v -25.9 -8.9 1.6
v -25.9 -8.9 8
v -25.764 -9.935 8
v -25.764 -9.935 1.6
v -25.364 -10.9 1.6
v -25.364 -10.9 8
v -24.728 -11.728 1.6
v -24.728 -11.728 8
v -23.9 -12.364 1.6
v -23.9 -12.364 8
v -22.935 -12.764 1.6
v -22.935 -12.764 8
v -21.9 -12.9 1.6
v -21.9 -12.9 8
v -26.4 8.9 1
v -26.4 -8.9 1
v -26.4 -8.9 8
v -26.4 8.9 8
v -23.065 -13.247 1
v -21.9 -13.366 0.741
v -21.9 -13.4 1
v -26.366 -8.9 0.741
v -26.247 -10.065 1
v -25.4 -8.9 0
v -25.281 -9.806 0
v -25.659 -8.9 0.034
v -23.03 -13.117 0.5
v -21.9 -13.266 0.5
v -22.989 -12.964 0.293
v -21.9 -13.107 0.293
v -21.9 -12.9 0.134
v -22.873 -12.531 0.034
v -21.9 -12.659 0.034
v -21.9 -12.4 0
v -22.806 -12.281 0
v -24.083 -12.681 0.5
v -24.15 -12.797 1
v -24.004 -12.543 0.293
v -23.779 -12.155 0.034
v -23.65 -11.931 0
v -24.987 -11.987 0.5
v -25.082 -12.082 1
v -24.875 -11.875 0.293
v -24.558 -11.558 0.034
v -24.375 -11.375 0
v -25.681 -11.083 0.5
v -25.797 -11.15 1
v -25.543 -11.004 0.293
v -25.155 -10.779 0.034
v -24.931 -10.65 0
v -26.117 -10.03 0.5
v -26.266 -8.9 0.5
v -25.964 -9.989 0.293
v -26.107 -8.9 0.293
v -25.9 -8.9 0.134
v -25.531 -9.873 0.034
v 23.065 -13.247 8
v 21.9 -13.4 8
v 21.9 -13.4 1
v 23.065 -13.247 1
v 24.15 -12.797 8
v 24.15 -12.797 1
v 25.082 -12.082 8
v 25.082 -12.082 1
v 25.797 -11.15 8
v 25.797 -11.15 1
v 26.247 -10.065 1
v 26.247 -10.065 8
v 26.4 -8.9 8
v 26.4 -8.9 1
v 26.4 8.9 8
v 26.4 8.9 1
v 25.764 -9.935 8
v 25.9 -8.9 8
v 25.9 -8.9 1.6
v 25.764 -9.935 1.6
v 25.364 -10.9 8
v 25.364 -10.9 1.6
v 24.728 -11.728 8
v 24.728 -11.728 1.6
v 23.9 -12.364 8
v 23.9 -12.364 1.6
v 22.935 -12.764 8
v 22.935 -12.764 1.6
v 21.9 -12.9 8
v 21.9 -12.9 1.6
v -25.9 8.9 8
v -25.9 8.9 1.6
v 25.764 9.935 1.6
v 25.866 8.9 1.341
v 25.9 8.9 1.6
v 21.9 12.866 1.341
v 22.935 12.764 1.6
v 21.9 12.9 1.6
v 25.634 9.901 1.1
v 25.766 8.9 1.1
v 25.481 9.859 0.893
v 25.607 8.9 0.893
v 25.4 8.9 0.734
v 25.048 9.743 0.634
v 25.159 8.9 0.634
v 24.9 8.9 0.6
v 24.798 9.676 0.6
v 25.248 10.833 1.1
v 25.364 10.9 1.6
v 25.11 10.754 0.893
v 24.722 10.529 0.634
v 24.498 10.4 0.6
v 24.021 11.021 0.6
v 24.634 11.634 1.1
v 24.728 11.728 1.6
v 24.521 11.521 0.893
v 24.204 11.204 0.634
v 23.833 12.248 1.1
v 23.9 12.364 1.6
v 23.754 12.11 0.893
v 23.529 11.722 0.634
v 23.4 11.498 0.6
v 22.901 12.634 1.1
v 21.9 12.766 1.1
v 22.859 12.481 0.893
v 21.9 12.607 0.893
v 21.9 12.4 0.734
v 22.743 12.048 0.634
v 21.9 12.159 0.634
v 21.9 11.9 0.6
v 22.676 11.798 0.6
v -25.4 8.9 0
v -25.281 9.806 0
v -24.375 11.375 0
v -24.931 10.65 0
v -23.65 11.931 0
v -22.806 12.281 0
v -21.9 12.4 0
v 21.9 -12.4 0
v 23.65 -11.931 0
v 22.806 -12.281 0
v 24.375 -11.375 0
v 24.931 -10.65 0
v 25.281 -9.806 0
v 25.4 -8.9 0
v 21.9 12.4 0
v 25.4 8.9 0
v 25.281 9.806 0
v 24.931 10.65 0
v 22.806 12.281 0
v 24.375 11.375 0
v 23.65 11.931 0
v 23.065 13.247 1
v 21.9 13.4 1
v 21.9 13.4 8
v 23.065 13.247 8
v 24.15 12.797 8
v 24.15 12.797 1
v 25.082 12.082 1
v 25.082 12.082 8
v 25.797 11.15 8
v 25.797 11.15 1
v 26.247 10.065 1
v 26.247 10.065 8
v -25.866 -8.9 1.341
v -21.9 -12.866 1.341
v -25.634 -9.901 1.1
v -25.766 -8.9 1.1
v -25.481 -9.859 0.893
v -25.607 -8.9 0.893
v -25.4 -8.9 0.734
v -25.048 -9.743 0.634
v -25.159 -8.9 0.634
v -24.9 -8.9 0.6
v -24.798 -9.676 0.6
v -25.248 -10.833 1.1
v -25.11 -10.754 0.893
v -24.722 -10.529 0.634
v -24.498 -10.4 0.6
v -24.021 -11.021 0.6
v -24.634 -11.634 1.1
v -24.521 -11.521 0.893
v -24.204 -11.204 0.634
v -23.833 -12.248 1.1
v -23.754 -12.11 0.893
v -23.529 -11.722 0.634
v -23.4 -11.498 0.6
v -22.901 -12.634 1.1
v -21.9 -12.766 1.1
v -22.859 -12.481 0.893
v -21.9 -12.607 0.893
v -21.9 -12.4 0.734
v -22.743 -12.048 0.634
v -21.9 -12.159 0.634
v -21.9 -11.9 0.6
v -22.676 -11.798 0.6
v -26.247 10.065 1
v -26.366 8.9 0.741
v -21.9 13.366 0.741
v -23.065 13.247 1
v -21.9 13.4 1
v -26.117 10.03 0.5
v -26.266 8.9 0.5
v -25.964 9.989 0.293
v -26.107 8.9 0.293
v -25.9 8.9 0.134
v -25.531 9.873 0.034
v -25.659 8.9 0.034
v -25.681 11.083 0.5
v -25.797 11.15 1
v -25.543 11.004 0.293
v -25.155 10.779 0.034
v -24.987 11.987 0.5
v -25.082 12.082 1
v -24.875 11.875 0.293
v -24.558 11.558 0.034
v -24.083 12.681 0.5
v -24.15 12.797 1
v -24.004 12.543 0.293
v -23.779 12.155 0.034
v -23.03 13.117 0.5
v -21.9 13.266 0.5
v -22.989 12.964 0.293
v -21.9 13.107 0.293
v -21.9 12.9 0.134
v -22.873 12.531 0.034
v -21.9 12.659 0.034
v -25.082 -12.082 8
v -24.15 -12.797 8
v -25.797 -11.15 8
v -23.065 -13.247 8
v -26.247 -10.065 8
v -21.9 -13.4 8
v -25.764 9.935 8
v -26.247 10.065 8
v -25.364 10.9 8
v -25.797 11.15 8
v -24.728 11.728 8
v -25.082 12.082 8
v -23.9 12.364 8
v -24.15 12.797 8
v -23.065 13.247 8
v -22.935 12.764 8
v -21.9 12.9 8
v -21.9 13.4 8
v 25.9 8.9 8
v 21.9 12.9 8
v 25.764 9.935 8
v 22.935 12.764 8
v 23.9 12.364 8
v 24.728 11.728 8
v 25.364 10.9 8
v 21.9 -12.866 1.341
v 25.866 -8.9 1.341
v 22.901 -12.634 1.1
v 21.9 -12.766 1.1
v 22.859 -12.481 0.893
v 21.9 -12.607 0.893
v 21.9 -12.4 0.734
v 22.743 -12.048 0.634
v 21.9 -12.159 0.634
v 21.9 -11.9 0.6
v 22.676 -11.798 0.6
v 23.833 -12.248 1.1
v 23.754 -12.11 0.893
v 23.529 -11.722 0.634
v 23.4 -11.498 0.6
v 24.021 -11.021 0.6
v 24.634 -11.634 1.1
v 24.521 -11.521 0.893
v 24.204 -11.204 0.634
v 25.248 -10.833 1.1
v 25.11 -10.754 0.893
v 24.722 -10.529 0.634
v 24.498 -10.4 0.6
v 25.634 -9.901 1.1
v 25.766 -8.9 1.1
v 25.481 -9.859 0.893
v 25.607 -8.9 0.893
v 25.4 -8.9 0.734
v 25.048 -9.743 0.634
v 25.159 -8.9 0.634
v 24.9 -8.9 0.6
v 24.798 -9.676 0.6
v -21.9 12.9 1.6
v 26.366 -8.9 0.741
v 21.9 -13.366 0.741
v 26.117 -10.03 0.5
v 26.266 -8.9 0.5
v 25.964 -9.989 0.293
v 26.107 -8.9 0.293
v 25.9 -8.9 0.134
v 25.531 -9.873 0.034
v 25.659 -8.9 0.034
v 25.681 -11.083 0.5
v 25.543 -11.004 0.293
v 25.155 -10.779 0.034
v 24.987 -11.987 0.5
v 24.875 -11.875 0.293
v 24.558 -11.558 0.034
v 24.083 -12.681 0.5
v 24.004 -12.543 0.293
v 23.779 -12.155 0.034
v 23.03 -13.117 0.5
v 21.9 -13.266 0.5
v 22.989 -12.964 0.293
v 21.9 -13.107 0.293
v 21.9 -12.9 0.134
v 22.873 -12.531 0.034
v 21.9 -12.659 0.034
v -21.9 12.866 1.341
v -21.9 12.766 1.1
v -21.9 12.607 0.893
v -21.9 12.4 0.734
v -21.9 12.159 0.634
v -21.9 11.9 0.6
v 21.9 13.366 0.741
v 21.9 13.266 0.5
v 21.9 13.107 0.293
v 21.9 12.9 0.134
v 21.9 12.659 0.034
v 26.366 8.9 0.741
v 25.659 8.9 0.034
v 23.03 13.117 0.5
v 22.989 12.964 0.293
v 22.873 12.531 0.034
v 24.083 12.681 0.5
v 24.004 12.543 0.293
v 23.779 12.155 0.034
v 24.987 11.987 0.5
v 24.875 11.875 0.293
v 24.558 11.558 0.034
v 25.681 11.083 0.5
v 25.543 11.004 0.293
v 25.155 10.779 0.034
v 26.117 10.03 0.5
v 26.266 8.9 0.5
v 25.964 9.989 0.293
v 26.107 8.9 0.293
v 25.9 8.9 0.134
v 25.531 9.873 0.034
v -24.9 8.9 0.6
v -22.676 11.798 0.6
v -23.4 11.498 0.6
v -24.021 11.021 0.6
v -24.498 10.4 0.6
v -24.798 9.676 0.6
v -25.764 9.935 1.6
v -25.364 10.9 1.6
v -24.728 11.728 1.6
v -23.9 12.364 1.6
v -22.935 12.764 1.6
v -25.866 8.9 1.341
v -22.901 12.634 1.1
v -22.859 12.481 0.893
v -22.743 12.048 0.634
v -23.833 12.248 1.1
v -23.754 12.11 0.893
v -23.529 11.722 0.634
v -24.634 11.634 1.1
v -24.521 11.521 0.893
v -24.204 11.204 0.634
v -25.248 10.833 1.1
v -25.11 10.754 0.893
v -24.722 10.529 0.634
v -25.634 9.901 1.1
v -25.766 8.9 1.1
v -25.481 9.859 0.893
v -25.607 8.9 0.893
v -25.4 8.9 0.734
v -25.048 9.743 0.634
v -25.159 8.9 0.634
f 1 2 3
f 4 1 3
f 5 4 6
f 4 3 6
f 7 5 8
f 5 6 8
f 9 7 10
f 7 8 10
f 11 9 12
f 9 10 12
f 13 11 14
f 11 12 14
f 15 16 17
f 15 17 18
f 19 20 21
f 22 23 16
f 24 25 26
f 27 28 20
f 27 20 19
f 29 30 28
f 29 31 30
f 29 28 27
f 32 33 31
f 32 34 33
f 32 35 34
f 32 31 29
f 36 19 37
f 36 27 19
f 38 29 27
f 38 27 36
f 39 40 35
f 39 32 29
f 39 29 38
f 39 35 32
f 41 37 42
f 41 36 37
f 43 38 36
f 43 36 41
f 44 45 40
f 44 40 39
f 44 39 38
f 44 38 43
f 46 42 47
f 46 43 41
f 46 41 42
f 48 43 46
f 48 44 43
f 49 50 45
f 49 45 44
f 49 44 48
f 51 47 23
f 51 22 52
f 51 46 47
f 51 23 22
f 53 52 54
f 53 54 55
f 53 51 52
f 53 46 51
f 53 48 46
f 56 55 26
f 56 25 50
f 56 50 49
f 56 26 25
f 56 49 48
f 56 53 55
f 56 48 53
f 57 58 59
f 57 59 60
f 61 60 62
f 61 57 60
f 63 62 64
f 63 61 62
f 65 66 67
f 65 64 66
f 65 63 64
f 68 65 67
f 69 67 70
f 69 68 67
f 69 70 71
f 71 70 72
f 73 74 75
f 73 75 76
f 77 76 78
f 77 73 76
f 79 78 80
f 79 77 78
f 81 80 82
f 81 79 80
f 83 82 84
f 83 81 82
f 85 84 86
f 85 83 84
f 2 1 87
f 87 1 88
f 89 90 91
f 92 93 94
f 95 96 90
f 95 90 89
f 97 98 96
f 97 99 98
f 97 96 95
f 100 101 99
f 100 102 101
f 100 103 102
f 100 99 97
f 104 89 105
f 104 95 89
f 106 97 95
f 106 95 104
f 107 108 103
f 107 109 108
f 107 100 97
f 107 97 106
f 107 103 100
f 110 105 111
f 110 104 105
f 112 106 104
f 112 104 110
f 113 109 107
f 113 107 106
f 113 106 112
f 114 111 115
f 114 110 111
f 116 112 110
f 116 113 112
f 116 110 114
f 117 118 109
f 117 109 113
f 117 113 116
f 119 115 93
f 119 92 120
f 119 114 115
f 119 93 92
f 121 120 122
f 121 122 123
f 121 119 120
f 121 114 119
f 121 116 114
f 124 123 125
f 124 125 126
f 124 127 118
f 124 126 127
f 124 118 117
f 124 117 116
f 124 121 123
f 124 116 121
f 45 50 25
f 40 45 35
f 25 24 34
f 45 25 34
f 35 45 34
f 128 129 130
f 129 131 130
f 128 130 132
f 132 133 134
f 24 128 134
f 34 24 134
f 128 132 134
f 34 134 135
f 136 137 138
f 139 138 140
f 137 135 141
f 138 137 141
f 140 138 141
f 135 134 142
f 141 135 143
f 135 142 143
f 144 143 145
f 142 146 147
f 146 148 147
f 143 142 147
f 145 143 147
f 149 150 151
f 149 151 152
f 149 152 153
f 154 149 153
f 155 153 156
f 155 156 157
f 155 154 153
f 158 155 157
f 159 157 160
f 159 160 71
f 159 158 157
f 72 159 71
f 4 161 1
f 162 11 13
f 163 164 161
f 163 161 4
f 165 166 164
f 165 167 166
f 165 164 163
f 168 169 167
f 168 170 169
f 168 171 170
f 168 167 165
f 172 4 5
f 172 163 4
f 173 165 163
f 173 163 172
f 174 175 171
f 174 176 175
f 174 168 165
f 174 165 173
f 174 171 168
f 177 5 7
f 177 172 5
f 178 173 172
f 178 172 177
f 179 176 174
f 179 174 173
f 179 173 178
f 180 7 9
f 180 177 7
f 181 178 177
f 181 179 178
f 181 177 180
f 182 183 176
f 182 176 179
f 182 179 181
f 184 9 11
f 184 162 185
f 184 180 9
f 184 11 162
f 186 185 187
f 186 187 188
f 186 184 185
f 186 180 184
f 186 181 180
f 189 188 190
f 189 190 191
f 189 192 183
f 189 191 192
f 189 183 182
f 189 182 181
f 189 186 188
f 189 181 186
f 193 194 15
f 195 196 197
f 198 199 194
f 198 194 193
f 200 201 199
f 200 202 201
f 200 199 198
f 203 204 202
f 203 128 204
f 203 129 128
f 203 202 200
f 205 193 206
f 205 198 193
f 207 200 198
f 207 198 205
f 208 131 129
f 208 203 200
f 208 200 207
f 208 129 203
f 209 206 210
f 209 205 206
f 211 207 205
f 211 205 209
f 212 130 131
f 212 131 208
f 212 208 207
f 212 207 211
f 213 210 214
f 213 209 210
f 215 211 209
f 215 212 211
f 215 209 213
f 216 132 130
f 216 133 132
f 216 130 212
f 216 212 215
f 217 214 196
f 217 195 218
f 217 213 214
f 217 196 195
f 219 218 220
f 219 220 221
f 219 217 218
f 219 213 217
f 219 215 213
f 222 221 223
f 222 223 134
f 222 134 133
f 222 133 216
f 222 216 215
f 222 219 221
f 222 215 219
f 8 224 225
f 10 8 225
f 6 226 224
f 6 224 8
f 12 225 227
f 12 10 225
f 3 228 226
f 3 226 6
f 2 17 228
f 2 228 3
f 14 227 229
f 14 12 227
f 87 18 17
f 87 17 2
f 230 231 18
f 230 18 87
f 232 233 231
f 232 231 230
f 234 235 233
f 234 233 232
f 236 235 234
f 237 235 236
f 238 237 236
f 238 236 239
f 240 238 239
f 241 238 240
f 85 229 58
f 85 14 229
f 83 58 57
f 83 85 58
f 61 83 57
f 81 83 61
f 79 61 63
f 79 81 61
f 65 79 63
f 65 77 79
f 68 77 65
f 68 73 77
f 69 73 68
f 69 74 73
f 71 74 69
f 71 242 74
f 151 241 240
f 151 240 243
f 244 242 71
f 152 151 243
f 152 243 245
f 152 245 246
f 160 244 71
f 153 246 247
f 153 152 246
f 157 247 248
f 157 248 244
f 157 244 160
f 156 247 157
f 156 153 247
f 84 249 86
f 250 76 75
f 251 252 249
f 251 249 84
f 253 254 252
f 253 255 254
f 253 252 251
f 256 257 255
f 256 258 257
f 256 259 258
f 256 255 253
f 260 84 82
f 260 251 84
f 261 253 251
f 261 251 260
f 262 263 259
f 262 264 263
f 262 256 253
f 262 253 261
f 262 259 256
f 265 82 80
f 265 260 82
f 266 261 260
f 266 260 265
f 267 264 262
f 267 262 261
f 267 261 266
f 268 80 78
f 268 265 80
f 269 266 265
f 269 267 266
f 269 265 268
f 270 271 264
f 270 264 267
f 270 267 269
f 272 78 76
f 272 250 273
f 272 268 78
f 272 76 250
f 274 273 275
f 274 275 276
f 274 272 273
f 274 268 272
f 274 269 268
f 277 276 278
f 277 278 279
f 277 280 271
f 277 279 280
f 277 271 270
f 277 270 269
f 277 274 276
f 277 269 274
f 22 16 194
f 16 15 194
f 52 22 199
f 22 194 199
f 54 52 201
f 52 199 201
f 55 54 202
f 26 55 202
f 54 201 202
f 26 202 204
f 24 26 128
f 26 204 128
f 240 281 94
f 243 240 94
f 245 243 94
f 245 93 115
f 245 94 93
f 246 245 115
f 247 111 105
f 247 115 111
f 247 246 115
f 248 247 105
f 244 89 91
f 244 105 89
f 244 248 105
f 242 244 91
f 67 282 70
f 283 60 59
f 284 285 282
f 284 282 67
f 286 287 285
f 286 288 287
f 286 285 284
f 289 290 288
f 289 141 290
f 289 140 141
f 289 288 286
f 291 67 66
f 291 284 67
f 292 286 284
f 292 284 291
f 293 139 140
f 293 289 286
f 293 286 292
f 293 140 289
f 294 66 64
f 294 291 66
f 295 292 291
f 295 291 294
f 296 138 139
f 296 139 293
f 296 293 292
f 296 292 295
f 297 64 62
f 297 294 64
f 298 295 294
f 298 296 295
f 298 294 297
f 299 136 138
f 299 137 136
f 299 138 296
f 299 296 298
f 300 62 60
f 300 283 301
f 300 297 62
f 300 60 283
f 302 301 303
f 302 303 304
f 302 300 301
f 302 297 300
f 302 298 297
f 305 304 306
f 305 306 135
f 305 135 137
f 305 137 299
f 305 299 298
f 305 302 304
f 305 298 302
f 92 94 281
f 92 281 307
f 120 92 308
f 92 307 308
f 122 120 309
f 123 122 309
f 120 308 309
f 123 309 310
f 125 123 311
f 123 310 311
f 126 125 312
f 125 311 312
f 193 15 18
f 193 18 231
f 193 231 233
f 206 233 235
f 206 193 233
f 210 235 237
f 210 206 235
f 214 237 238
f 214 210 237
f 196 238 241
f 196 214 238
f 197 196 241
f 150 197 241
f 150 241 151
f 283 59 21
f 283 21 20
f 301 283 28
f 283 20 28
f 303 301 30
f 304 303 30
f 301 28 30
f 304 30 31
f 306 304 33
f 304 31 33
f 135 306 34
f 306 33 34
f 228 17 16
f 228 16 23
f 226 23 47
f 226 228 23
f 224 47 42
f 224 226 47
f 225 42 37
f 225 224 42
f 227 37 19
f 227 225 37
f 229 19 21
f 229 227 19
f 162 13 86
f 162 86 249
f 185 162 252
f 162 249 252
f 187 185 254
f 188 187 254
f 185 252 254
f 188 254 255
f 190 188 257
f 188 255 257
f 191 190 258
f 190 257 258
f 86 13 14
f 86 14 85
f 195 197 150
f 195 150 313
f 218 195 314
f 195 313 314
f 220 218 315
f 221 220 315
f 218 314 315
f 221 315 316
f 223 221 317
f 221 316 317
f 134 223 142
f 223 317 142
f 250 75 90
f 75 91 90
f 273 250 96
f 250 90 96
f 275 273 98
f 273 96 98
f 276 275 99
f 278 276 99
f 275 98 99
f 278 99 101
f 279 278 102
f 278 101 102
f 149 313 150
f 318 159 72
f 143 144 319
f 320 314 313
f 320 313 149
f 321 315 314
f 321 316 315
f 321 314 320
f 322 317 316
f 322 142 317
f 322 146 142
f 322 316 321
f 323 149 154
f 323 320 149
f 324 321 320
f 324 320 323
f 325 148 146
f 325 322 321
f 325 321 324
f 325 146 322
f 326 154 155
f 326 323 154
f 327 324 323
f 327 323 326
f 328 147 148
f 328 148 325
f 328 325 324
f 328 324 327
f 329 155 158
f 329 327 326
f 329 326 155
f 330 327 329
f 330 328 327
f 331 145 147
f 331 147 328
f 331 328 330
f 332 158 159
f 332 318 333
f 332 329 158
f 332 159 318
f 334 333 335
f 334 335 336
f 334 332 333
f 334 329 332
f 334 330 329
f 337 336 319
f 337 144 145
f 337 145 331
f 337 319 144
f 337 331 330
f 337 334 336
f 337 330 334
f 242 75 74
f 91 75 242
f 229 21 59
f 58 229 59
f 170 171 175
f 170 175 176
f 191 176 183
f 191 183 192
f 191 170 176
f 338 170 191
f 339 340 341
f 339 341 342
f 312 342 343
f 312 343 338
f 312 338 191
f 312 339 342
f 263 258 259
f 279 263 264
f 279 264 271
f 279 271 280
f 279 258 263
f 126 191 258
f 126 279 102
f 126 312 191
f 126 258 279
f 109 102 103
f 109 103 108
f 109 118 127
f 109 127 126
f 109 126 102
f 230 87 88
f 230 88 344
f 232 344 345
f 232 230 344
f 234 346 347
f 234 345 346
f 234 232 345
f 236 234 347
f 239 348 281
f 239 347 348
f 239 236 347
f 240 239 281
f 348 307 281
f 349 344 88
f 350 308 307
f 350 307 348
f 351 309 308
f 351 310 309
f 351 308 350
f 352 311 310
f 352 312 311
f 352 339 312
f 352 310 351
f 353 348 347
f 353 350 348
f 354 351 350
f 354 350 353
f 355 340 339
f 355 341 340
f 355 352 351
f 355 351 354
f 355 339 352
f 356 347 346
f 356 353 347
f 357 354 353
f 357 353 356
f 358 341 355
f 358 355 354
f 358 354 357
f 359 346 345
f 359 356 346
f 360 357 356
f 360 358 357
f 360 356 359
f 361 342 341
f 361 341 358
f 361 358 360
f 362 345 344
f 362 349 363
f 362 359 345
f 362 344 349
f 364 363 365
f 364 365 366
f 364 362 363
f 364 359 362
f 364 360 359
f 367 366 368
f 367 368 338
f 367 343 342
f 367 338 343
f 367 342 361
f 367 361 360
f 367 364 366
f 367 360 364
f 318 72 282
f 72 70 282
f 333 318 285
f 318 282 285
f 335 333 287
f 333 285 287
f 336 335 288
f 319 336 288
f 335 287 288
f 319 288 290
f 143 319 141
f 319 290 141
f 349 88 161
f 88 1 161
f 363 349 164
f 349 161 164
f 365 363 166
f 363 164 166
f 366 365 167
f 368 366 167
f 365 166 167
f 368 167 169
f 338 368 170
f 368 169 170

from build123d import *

# Parameters (mm, degrees)
F0_W     = 52.8
F0_H     = 26.8
F0_W_2   = 51.8
F0_H_2   = 25.8
F1_DEPTH = 0.6
F2_DEPTH = 8
F3_R     = 4
F4_R     = 4.5
F5_R     = 1


with BuildPart() as f1:
    # F0 (on Top) → F1 (new body)
    with BuildSketch(Plane.XY):
        Rectangle(F0_W, F0_H)
        Rectangle(F0_W_2, F0_H_2, mode=Mode.SUBTRACT)
        Rectangle(F0_W_2, F0_H_2)
    extrude(amount=F1_DEPTH)

    # F0 (on Top) → F2 (join)
    with BuildSketch(Plane.XY):
        Rectangle(F0_W, F0_H)
        Rectangle(F0_W_2, F0_H_2, mode=Mode.SUBTRACT)
    extrude(amount=F2_DEPTH)

    # F3
    f3_edges = [f1.edges().sort_by_distance(p)[0] for p in [
        (-25.9, 12.9, 4.3),
        (25.9, 12.9, 4.3),
        (25.9, -12.9, 4.3),
        (-25.9, -12.9, 4.3),
    ]]
    fillet(f3_edges, radius=F3_R)

    # F4
    f4_edges = [f1.edges().sort_by_distance(p)[0] for p in [
        (26.4, 13.4, 4),
        (26.4, -13.4, 4),
        (-26.4, 13.4, 4),
        (-26.4, -13.4, 4),
    ]]
    fillet(f4_edges, radius=F4_R)

    # F5
    f5_edges = [f1.edges().sort_by_distance(p)[0] for p in [
        (0, 12.9, 0.6),
        (0, 13.4, 0),
    ]]
    fillet(f5_edges, radius=F5_R)


solid = f1.part
